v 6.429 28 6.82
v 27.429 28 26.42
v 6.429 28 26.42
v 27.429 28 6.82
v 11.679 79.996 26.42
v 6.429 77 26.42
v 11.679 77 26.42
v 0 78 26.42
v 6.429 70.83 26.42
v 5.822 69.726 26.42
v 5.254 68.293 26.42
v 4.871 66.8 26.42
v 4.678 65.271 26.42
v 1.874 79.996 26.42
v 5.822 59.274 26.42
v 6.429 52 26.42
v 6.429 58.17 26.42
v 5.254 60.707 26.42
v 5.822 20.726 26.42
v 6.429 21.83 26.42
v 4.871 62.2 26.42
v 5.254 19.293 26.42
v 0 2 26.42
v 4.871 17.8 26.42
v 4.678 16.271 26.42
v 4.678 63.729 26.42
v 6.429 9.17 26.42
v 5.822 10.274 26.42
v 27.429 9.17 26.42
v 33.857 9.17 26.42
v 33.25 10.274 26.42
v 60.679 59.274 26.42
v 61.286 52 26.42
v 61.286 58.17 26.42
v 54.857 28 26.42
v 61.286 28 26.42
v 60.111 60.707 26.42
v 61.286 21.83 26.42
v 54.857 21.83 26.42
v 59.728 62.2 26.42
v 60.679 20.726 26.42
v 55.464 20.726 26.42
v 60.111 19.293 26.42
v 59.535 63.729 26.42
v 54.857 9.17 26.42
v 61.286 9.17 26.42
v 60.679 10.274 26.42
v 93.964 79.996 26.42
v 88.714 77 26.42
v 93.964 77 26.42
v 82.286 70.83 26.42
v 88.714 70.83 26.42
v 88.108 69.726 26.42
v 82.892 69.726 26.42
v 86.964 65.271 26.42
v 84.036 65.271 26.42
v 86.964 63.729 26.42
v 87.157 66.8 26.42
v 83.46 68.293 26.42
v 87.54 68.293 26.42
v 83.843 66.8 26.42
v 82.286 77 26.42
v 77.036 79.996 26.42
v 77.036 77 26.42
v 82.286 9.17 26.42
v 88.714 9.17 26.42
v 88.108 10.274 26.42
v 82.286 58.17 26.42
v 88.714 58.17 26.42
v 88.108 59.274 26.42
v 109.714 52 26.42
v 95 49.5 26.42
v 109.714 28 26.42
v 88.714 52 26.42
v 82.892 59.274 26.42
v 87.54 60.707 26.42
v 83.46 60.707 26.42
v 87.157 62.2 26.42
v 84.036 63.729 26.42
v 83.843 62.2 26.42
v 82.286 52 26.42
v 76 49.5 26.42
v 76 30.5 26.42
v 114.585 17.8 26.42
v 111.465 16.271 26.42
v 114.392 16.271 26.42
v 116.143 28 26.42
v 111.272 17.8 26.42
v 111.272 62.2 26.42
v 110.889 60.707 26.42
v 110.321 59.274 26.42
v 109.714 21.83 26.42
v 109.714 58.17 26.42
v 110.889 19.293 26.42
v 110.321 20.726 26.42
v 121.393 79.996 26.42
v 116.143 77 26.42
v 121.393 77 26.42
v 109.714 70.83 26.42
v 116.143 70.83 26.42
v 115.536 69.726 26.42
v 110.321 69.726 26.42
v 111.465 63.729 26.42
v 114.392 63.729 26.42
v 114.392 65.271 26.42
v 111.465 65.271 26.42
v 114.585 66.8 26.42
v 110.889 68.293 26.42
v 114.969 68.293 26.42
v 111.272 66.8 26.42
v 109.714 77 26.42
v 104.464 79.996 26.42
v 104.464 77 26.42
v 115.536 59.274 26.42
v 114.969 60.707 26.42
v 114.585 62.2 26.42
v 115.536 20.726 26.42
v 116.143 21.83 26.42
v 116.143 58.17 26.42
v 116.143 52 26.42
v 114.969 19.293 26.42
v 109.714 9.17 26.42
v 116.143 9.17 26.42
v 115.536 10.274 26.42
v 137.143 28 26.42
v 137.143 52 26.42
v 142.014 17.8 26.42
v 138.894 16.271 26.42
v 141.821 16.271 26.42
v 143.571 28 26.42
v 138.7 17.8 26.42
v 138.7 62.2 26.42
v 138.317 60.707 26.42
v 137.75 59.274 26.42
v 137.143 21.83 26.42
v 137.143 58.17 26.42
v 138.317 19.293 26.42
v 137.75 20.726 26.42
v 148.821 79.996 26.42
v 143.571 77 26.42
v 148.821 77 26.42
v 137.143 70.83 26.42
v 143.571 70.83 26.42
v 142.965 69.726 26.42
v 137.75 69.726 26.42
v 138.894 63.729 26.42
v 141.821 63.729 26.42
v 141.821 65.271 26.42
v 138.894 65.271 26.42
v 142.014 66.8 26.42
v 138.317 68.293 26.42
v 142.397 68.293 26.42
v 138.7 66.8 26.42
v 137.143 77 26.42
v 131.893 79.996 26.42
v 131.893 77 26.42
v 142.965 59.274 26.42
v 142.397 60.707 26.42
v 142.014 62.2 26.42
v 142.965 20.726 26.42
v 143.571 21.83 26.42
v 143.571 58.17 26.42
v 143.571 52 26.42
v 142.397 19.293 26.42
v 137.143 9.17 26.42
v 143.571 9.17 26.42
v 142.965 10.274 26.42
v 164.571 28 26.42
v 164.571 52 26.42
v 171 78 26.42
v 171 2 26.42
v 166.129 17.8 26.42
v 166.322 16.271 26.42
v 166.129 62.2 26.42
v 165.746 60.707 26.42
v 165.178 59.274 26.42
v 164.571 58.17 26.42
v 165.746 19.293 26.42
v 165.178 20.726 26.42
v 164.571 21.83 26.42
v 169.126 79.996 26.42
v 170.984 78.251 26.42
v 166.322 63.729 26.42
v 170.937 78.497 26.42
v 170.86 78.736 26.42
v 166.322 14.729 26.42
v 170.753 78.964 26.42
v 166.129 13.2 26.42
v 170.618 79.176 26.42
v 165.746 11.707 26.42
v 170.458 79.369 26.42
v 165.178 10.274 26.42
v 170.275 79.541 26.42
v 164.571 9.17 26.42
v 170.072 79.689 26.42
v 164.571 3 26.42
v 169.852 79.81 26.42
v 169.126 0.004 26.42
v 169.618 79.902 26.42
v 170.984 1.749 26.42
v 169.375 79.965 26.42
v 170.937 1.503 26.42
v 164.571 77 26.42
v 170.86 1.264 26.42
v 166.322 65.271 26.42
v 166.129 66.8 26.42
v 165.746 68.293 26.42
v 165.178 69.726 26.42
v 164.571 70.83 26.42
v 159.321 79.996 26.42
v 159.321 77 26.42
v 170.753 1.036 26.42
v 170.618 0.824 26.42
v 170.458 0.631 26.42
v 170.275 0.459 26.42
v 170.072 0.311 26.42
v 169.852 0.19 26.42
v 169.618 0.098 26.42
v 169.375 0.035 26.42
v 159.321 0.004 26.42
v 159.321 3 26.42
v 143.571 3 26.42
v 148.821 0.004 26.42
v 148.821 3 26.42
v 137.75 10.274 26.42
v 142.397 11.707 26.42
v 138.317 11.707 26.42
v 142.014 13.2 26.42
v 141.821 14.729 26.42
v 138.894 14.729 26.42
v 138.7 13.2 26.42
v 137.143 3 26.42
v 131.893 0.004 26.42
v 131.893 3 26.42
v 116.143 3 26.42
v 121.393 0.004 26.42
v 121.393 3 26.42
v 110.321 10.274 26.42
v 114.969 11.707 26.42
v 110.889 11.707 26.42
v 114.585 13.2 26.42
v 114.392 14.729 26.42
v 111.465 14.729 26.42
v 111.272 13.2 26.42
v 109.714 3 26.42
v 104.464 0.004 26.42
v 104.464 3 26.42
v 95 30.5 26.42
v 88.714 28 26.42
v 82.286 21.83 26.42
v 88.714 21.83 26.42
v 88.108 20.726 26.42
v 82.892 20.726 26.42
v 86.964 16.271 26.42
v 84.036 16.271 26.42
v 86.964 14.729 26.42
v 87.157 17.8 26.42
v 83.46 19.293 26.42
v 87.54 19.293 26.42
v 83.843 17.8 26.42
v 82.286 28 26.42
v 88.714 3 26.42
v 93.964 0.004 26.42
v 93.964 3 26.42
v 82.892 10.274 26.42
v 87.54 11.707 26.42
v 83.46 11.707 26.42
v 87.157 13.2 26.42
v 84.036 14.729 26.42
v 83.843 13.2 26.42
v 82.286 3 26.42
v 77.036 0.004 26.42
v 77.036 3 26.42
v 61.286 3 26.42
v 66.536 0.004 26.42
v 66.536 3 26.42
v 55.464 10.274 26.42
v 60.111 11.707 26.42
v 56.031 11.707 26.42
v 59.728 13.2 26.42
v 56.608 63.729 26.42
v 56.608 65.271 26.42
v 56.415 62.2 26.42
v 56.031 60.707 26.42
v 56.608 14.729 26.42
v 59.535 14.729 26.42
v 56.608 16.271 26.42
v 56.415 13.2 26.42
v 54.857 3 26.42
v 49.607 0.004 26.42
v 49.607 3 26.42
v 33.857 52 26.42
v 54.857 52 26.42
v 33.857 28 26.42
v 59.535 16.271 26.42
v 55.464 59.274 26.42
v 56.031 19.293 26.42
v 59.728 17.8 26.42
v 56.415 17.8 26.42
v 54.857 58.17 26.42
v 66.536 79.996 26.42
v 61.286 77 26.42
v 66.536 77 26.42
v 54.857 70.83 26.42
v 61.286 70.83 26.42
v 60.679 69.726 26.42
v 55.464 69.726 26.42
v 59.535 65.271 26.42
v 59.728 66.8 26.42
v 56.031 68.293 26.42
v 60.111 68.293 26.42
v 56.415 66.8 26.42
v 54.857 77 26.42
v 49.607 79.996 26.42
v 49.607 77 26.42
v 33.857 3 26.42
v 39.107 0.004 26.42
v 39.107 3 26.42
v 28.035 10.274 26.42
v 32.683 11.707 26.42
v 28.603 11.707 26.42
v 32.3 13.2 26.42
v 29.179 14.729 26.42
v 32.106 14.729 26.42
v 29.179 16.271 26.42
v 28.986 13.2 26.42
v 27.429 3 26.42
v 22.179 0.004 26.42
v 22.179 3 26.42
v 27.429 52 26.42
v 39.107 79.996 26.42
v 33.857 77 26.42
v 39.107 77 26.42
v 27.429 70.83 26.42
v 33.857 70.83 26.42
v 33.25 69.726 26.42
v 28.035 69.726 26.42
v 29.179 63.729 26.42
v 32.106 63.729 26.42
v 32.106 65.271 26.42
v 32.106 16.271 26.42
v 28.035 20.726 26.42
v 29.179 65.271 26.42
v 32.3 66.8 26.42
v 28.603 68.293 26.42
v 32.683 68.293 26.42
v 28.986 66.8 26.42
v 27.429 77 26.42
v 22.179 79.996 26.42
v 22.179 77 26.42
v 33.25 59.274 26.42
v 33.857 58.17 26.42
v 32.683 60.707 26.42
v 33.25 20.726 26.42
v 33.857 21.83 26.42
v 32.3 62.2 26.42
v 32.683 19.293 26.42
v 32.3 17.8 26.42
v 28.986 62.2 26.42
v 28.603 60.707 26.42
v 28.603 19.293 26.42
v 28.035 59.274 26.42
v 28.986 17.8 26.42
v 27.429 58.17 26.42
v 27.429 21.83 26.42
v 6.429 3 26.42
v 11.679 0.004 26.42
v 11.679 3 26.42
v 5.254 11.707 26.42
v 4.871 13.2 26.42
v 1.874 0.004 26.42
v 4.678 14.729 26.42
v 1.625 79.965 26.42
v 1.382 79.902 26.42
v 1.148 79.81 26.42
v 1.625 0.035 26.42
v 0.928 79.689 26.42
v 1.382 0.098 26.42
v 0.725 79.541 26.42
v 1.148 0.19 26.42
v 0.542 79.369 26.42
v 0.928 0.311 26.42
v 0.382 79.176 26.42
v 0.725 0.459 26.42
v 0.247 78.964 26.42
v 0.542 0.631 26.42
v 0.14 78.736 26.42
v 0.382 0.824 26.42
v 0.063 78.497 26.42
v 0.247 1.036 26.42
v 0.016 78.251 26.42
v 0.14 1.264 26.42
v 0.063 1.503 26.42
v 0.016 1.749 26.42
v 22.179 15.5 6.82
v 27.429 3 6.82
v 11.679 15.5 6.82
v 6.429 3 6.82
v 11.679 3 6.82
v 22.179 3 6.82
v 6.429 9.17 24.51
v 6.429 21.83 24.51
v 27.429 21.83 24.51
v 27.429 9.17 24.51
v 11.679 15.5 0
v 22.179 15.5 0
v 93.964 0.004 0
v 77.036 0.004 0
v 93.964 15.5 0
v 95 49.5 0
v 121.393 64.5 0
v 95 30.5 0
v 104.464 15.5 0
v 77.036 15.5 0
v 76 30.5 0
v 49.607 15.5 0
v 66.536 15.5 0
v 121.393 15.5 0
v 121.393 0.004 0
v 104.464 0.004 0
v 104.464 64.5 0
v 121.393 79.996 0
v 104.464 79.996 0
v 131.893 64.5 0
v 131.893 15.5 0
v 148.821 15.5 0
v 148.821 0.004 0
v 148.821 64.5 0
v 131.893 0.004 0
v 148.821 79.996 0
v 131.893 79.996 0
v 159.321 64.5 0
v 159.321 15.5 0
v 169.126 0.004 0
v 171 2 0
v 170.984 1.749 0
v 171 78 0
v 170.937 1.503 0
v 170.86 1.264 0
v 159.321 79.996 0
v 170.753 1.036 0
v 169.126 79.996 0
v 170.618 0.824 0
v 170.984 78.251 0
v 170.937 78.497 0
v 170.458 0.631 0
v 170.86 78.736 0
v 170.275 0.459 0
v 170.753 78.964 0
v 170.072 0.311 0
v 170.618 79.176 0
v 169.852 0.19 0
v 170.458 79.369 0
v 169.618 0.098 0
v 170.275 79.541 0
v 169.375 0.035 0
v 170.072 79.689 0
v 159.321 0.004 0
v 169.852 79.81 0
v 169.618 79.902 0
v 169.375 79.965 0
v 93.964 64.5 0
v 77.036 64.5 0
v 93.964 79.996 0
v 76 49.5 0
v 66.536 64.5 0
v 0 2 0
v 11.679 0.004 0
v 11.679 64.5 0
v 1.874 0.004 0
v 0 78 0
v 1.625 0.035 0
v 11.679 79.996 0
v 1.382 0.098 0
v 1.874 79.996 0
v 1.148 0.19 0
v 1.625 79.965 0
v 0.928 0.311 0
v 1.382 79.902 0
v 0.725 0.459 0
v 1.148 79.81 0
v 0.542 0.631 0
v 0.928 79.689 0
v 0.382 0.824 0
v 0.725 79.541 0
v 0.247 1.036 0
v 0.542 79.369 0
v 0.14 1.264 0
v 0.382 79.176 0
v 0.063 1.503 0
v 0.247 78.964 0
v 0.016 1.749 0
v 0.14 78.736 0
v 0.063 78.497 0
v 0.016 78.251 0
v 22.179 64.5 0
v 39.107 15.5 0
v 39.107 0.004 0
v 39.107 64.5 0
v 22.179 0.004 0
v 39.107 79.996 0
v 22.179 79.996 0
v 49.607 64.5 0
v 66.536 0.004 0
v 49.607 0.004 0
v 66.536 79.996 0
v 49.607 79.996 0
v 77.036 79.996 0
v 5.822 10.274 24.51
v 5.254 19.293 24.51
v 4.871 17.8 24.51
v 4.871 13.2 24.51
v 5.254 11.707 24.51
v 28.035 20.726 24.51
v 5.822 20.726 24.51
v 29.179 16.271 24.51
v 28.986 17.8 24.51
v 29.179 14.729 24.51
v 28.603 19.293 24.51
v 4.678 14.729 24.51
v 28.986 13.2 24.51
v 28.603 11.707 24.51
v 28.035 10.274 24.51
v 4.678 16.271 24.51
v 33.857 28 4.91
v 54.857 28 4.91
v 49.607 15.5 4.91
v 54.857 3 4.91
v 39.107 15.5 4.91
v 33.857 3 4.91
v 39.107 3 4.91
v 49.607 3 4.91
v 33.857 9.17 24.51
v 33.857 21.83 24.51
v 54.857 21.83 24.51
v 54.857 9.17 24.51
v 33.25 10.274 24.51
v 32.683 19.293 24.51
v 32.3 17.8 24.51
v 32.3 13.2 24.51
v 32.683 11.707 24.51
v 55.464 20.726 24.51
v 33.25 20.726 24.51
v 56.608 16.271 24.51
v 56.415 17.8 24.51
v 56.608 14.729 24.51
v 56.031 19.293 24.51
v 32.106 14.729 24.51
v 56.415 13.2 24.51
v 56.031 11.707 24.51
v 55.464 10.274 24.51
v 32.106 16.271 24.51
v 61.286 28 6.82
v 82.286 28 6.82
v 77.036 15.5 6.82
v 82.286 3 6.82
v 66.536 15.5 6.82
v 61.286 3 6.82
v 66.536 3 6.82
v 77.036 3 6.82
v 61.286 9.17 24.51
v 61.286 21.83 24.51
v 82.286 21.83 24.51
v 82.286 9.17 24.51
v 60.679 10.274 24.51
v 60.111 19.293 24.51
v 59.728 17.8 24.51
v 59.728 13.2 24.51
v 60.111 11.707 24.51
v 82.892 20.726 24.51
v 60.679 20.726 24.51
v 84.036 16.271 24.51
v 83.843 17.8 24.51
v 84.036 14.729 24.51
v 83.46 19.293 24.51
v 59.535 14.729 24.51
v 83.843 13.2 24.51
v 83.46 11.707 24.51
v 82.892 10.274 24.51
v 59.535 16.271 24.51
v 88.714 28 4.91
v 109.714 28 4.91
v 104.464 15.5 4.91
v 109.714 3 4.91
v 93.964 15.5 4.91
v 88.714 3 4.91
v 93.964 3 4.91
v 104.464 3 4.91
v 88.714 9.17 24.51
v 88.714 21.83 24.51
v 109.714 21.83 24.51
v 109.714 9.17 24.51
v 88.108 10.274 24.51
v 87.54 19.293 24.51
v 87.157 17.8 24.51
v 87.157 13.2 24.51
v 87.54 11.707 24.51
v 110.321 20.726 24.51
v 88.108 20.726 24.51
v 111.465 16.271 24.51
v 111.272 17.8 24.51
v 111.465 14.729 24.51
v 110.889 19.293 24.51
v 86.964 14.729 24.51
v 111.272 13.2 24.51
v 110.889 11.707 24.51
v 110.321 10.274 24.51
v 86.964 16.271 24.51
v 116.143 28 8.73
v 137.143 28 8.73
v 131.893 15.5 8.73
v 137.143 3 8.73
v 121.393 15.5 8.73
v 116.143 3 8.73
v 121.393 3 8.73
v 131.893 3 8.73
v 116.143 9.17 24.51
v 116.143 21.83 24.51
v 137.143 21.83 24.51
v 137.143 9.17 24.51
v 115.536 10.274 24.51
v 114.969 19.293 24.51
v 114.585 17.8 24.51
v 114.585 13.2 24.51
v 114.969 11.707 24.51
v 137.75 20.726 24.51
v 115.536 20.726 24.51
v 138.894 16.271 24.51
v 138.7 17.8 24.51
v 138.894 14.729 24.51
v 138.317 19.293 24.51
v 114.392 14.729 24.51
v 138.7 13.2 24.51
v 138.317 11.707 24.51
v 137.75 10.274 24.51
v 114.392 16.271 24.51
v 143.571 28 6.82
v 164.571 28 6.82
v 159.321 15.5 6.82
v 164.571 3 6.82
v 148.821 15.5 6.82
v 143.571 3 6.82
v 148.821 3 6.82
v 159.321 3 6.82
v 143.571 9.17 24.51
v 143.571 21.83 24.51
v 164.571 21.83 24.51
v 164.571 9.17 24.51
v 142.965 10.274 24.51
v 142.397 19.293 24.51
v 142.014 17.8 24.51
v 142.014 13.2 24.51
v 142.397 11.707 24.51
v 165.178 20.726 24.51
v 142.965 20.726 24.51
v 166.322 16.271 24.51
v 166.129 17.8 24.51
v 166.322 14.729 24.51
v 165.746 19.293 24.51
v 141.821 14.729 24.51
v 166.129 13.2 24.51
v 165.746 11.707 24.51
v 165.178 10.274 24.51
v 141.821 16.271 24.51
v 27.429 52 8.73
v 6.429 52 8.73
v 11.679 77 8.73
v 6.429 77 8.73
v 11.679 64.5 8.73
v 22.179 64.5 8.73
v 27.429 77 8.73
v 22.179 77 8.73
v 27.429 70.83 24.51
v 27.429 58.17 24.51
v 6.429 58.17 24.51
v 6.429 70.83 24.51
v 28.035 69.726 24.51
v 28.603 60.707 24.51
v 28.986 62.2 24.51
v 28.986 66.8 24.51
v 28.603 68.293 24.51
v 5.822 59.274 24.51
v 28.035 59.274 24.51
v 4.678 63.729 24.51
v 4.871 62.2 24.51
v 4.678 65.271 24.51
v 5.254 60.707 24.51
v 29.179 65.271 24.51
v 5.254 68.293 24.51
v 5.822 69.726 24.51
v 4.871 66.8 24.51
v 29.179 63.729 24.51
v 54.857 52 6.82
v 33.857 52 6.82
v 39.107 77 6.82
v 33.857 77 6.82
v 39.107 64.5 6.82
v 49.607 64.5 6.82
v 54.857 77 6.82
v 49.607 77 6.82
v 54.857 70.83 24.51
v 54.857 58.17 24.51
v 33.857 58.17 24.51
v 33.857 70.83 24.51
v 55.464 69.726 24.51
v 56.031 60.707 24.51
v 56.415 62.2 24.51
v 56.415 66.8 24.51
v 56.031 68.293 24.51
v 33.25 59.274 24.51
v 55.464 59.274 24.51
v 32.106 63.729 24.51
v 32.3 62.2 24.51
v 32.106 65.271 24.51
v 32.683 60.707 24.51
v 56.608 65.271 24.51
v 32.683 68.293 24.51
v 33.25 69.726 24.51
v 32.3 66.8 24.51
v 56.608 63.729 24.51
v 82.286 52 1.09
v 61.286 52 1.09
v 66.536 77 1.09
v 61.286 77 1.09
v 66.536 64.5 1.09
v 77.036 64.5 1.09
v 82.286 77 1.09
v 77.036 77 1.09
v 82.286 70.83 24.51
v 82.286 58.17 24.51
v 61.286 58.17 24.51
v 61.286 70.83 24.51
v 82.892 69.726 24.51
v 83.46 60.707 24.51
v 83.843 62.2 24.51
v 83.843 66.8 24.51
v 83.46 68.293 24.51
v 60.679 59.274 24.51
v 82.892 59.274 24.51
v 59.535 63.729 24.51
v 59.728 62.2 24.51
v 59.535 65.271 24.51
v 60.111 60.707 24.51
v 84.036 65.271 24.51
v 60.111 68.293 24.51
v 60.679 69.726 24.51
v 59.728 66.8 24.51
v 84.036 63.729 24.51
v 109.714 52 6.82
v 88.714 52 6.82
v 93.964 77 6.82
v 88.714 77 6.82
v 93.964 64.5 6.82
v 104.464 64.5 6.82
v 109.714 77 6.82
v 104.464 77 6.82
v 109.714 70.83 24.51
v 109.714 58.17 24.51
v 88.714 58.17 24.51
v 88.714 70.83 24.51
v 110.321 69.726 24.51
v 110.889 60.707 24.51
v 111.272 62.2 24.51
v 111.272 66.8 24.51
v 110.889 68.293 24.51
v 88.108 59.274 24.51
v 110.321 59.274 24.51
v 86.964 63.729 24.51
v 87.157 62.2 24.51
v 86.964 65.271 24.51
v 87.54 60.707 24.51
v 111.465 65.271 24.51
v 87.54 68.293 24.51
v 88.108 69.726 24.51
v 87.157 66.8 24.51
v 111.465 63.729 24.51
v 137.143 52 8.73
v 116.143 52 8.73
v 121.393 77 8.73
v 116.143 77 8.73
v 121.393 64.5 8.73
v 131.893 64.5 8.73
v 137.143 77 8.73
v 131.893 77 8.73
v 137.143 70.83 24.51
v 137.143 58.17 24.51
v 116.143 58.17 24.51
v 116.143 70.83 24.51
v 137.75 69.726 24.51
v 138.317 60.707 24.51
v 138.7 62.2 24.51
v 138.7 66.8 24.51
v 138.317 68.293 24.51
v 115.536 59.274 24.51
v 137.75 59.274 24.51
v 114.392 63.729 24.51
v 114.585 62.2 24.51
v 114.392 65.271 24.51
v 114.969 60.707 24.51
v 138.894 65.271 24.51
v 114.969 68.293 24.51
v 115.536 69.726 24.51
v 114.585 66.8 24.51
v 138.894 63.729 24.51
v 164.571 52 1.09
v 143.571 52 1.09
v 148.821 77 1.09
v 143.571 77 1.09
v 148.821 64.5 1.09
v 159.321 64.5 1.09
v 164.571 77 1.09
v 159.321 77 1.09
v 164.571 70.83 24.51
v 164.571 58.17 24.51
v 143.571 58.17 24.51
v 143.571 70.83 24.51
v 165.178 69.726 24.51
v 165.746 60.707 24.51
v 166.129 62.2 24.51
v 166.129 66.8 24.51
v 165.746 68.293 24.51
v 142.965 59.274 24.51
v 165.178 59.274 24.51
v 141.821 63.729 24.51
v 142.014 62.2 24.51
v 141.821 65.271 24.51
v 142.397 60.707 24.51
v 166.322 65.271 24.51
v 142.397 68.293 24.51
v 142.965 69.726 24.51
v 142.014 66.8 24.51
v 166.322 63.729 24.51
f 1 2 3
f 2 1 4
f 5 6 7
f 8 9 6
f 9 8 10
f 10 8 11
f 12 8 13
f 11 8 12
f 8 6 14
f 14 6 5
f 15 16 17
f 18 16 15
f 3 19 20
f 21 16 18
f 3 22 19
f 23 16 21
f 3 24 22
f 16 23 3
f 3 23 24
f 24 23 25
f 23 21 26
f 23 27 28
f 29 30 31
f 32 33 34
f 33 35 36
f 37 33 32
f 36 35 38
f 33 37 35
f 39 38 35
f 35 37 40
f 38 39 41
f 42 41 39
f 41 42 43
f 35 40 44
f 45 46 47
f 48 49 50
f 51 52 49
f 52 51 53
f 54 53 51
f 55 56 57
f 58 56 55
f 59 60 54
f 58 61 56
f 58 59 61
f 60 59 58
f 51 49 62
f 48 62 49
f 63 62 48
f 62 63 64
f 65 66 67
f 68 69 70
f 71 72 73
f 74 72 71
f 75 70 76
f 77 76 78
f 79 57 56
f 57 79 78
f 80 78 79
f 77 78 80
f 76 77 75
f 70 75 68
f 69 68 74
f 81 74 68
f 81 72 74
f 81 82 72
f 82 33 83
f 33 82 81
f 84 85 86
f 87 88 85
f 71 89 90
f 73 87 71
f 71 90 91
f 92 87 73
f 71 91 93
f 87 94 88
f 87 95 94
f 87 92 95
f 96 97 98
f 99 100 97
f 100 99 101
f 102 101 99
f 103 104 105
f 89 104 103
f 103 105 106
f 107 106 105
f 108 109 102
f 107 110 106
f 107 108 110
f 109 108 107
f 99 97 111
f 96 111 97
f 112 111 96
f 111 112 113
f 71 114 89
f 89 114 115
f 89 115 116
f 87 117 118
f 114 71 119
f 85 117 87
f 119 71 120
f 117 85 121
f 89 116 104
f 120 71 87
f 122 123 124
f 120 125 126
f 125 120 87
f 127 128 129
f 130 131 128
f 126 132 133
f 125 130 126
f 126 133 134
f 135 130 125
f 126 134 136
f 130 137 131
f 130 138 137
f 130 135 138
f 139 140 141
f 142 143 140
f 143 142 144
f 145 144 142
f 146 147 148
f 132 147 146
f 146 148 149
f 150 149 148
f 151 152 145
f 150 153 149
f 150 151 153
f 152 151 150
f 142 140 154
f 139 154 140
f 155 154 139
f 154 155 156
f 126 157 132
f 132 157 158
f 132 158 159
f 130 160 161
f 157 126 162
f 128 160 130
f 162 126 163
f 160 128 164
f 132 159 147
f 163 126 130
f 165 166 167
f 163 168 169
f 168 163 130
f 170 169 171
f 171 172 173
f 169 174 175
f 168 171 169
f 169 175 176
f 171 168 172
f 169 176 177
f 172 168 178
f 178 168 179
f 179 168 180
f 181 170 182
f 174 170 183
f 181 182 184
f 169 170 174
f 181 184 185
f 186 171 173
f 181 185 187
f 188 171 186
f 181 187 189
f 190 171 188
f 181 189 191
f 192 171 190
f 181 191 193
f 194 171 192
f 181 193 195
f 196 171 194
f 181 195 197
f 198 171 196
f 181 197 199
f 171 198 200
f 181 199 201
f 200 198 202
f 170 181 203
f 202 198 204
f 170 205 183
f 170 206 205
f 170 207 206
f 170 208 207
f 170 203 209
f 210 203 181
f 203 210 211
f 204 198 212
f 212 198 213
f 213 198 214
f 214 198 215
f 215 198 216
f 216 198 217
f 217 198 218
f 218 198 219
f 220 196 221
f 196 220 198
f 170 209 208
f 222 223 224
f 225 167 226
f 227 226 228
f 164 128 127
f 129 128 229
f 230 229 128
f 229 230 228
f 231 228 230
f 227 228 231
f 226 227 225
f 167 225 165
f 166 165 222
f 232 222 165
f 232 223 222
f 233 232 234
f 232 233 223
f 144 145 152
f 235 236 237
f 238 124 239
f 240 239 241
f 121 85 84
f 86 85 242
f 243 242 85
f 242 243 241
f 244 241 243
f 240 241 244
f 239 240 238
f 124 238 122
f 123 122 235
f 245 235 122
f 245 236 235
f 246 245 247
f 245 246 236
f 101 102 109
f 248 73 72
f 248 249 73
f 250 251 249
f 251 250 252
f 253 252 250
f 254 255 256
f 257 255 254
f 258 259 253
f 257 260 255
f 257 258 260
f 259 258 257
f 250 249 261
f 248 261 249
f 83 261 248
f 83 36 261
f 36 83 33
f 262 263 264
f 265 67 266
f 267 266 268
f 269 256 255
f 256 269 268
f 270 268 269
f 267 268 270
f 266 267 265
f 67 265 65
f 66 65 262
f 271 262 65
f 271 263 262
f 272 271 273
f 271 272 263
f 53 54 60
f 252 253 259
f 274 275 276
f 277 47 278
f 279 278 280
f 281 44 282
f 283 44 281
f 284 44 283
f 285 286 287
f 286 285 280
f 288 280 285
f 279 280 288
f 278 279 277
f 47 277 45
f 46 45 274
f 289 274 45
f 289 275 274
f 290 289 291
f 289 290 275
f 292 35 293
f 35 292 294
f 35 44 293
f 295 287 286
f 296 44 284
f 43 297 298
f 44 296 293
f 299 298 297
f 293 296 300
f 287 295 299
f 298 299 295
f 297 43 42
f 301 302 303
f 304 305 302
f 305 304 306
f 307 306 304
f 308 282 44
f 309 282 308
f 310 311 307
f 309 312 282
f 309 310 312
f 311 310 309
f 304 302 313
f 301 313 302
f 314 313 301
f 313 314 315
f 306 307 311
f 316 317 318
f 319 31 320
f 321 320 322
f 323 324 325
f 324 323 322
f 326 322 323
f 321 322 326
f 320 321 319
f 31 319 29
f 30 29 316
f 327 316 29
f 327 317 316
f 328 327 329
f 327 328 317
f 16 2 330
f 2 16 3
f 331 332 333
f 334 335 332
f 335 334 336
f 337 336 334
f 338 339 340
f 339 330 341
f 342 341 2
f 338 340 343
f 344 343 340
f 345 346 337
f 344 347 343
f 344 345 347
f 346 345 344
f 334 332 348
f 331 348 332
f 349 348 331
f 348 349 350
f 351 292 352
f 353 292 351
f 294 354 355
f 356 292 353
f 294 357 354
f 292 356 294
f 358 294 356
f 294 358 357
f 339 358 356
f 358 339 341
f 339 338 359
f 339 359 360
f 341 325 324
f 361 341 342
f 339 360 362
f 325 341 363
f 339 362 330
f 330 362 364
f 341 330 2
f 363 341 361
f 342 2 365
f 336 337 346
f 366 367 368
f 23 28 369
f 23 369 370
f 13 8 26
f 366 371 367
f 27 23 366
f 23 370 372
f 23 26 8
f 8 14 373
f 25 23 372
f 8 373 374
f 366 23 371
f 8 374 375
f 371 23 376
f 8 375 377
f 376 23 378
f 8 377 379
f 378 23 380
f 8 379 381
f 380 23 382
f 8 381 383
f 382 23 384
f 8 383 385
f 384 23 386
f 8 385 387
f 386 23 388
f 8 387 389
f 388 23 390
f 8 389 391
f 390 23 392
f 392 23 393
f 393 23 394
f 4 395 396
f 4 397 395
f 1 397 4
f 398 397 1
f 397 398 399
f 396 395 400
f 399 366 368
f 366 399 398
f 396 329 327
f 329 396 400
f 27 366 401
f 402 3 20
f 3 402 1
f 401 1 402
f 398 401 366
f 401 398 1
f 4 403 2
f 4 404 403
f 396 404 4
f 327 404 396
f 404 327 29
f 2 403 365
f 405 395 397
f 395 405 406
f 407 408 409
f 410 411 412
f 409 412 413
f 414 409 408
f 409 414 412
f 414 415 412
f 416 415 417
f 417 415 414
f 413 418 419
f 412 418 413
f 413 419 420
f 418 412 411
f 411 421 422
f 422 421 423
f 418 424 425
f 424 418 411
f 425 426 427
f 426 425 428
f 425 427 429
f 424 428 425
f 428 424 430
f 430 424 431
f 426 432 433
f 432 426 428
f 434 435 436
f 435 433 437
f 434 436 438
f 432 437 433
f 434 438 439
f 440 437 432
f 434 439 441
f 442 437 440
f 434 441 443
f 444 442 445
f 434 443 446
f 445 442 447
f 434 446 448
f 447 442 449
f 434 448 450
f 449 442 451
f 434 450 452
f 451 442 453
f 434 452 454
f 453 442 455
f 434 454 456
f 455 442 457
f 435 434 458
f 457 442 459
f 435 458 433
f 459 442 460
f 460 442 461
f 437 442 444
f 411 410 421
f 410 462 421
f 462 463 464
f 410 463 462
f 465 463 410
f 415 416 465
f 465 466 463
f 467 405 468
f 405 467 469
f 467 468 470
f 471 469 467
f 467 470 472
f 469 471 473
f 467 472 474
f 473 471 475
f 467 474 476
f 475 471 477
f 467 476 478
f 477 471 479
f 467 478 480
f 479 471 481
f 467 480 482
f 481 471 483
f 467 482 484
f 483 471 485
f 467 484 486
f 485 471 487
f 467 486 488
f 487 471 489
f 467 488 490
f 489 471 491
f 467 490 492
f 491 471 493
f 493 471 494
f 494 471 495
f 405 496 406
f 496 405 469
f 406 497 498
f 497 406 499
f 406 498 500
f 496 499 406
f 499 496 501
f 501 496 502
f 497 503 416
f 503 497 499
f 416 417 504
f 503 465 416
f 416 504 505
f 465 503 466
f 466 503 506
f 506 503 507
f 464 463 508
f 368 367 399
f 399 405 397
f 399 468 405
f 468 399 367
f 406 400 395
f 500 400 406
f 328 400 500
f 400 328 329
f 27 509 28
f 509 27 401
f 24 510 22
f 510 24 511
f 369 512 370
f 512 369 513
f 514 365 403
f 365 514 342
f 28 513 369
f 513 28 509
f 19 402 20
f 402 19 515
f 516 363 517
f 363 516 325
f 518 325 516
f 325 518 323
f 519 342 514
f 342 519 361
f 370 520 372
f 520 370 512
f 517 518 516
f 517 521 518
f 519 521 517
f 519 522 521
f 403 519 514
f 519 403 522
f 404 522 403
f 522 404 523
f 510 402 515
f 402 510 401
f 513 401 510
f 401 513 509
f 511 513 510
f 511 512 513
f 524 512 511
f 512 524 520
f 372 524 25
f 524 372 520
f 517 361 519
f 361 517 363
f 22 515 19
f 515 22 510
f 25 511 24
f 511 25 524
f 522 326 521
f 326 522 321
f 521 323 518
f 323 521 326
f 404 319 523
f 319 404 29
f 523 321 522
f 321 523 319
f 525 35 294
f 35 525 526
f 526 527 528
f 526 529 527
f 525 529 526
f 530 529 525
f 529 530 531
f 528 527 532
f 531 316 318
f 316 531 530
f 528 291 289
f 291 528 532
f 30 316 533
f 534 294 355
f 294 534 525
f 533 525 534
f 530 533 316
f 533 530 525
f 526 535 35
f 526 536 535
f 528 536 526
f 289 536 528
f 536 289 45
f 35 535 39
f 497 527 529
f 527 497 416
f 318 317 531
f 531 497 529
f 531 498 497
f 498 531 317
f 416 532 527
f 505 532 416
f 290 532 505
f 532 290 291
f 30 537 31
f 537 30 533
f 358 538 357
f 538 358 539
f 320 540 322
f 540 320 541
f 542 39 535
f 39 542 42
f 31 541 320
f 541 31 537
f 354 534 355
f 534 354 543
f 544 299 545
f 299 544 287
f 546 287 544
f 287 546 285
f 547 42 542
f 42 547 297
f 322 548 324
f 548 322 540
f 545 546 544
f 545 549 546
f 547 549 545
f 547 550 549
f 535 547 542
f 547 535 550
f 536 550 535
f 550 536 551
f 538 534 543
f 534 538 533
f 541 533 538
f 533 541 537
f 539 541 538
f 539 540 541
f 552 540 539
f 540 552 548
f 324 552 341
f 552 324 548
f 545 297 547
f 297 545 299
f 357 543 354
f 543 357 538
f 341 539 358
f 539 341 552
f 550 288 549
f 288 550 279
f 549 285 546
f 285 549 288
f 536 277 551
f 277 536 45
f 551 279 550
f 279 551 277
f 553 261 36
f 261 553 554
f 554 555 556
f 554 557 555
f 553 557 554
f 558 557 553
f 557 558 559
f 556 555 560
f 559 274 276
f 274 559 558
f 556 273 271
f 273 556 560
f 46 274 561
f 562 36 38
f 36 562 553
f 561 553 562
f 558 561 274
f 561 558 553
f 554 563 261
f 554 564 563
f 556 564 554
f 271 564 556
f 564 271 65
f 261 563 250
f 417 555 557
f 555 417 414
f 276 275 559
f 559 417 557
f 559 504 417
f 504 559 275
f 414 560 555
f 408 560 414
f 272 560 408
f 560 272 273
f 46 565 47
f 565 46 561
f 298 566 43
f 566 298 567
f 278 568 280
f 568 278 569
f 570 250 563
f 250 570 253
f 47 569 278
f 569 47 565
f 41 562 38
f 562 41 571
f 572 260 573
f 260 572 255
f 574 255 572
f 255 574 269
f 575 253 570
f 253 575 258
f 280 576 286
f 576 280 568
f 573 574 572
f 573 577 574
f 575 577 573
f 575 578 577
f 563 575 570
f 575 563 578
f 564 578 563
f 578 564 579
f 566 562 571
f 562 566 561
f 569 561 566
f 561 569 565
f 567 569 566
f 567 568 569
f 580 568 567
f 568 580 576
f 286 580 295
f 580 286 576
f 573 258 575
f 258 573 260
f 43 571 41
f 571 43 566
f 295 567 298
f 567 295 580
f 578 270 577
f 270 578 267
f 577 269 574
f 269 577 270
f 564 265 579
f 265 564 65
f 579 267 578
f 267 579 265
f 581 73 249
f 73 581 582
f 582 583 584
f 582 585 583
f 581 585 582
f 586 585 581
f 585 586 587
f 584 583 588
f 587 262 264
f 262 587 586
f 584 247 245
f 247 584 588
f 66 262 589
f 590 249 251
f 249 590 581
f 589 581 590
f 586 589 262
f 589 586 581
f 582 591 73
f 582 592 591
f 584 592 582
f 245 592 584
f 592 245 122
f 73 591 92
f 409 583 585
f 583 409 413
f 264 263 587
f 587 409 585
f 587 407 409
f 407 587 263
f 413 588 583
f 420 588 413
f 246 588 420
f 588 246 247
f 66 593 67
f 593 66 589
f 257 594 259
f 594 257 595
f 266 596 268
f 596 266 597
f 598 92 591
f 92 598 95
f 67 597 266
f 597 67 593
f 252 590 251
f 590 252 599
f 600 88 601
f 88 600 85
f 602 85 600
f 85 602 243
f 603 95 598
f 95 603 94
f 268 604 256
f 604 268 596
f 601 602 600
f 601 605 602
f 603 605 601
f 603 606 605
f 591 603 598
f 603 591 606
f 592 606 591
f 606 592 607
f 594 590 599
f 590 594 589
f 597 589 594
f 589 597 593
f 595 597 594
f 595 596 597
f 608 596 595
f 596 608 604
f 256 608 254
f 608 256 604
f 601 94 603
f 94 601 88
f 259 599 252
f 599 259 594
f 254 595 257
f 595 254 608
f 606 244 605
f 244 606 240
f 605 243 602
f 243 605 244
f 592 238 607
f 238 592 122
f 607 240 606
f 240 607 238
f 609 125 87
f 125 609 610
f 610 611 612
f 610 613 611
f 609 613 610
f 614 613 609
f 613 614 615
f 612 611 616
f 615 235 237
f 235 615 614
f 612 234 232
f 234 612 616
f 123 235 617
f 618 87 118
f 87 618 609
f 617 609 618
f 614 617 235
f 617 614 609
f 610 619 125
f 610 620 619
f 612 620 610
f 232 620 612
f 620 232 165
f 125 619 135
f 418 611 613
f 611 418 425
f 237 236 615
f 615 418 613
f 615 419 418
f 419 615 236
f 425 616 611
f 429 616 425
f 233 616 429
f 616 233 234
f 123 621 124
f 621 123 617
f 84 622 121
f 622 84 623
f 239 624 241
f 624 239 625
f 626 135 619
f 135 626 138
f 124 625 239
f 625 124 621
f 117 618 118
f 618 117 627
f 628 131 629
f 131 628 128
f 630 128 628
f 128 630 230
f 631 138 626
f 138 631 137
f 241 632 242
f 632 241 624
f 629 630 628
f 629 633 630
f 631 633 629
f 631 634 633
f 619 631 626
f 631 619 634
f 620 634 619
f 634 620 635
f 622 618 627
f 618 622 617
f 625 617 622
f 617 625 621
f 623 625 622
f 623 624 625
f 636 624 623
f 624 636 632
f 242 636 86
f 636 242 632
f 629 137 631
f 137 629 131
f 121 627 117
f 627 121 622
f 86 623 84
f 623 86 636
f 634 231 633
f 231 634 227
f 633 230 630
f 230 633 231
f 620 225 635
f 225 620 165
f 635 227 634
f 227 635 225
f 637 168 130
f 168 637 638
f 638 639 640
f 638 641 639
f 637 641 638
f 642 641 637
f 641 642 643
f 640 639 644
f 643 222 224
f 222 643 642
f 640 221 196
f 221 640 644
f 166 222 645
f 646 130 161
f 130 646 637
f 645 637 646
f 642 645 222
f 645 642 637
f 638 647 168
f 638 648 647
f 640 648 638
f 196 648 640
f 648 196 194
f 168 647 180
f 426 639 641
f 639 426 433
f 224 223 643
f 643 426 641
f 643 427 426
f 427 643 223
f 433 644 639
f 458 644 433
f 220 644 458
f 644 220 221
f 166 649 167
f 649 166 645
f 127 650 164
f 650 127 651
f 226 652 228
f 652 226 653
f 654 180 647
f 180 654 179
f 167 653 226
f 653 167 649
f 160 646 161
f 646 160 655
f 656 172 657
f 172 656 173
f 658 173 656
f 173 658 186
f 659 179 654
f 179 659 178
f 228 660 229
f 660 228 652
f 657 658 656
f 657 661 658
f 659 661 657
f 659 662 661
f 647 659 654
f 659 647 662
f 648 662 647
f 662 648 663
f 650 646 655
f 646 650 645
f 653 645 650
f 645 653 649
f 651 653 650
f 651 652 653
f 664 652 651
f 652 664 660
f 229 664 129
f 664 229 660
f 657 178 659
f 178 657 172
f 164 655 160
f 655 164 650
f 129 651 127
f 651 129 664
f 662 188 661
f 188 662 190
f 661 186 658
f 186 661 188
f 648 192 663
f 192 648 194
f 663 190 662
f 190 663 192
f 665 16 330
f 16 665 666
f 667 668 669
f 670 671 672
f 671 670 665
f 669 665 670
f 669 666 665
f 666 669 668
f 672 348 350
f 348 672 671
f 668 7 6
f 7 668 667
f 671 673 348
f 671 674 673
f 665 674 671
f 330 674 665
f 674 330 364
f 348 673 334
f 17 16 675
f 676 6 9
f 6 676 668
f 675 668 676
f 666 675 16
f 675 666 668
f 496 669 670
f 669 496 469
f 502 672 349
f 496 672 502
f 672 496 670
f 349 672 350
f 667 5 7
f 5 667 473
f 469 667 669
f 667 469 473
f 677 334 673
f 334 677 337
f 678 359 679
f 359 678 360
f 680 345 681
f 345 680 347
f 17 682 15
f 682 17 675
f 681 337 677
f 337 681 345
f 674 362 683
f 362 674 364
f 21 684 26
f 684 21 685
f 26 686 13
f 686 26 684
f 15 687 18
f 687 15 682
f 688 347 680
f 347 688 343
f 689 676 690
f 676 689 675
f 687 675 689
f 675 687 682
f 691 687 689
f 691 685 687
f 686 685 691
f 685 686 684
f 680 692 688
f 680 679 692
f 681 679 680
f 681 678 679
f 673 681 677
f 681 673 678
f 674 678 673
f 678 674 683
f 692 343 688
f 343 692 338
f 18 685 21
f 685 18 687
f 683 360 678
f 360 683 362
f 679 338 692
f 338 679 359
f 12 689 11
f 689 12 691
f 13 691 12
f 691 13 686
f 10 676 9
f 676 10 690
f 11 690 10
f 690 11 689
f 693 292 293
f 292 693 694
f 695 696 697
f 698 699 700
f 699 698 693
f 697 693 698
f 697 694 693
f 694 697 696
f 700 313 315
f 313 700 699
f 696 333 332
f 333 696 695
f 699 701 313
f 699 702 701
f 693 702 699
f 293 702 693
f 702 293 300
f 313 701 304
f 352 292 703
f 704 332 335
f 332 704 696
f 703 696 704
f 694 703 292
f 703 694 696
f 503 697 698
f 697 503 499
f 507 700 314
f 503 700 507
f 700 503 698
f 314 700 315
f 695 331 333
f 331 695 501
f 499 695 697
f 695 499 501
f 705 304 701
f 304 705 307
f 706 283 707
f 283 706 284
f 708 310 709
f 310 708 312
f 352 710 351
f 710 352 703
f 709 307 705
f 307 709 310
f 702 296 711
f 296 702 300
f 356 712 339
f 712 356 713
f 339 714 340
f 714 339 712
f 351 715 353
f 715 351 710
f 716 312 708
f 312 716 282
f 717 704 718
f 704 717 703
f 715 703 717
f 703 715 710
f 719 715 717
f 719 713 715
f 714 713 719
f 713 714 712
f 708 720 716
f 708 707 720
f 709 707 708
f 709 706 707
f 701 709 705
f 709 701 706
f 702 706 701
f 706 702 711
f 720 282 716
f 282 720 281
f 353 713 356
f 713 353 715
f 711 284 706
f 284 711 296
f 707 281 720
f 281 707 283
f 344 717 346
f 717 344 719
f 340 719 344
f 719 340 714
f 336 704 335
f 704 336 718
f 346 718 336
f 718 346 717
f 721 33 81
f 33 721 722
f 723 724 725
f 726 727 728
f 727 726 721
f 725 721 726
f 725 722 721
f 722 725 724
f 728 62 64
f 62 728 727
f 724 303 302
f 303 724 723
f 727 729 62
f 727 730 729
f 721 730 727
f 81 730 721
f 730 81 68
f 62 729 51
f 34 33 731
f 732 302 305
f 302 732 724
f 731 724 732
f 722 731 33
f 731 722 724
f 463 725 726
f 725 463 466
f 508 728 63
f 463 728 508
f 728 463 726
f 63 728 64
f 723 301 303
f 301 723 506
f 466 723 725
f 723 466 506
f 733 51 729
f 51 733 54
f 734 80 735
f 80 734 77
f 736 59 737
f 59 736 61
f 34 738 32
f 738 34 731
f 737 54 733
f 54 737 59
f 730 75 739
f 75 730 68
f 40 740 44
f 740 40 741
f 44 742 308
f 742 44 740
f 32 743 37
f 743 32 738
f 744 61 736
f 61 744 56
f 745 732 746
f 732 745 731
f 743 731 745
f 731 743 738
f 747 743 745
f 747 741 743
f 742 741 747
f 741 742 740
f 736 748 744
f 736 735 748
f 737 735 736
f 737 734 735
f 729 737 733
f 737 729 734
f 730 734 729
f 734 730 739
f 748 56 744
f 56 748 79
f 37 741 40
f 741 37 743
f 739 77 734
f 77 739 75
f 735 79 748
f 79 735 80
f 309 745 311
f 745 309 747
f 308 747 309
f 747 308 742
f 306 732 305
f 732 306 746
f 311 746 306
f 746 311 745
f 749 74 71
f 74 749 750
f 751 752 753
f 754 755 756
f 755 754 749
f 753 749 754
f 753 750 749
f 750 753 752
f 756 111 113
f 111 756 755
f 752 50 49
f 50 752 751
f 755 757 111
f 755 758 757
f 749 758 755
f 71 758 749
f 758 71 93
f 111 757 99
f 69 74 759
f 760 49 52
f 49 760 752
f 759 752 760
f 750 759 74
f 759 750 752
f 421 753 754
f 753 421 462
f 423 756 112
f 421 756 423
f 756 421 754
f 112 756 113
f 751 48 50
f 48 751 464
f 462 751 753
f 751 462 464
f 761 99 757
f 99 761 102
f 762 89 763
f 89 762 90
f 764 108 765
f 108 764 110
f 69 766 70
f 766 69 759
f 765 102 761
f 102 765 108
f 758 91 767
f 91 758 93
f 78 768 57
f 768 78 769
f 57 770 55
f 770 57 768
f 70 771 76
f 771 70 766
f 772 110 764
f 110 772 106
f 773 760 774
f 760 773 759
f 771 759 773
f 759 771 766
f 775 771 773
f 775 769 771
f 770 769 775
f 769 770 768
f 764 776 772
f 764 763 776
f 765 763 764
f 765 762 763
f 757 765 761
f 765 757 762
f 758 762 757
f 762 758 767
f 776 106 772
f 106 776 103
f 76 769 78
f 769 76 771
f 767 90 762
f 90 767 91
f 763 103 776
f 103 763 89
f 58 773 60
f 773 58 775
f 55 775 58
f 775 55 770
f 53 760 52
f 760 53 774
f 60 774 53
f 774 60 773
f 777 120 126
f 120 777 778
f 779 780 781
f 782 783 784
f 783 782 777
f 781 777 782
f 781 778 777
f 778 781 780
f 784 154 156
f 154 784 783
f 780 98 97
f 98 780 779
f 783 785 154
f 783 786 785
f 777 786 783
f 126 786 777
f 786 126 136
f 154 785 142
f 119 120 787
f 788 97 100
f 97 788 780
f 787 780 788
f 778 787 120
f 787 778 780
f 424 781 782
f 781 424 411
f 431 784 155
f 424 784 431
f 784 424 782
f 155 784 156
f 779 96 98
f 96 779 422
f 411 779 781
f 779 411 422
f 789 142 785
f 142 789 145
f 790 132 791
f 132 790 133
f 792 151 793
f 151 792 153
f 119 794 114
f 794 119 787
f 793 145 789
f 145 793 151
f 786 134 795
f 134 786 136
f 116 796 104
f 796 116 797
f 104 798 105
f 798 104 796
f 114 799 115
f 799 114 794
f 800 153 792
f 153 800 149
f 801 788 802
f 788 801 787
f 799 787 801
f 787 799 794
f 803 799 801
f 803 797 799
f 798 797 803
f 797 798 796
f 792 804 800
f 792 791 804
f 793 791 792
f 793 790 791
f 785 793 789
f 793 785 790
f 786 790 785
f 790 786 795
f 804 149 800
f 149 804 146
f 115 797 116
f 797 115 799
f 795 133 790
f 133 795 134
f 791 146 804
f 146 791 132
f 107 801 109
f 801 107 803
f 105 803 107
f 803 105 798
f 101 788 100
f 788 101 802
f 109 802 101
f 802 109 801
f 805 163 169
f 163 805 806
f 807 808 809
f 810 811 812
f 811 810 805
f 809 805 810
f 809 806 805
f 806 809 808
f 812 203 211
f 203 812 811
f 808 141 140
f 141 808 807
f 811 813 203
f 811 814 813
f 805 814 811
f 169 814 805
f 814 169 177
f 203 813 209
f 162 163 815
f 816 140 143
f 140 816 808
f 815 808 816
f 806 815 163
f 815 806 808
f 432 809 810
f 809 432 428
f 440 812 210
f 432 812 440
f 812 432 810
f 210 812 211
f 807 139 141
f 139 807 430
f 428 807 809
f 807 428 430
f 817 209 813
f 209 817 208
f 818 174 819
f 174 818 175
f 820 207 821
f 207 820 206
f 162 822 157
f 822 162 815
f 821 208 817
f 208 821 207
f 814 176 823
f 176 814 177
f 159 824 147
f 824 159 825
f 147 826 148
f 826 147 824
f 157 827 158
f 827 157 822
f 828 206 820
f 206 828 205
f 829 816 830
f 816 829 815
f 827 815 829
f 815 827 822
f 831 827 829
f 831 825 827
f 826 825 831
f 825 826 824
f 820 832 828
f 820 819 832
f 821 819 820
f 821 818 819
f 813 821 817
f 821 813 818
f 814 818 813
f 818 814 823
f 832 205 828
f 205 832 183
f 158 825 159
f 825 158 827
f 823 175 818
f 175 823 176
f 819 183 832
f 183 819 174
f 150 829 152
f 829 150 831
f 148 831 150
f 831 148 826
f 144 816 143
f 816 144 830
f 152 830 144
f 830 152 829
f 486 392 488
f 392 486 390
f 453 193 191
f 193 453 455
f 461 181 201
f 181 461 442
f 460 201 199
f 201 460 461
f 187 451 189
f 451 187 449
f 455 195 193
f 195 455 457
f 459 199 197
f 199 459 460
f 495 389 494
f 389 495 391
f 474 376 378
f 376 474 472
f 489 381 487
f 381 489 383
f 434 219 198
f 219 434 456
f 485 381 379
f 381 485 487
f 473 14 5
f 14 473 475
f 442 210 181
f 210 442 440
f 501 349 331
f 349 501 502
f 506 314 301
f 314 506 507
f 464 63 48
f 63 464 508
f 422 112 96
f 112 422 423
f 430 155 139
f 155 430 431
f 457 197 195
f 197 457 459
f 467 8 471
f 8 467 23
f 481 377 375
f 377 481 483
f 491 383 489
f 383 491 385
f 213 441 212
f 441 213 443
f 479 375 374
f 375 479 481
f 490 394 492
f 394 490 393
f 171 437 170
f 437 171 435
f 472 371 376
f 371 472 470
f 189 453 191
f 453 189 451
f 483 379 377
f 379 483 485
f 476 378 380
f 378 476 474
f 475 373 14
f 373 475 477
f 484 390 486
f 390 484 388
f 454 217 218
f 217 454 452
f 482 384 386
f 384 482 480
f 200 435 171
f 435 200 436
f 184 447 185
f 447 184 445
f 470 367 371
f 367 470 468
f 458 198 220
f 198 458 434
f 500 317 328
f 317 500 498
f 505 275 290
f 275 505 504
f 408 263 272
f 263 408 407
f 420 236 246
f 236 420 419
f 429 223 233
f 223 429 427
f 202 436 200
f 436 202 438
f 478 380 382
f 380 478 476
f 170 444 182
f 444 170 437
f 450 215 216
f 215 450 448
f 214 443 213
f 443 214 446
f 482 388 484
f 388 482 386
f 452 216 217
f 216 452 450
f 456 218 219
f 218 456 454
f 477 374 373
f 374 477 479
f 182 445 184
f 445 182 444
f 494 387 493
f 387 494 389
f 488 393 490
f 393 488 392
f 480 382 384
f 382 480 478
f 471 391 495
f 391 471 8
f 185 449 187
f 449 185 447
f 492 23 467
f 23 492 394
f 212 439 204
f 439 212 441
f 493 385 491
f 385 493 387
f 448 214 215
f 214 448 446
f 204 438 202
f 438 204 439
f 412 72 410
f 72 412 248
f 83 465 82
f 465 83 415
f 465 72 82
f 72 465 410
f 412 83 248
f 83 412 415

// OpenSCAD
// file: SquareWithCircleTokenPileLib.scad
module LeftPile(
    wallThickness,
    totalHeight,
    singlePileHeight,
    singlePileWidth,
    singlePileLength,
    pileCount,
    circleTokenDiameter,
    circleTokenHeight,
    openingSizePercent = .75
) {
    pileHeight = (pileCount * singlePileHeight) + .5 + circleTokenHeight;
    lengthOpeningSize = singlePileLength * openingSizePercent;
    widthOpeningSize = singlePileWidth * openingSizePercent;
    blockerSize = (singlePileWidth - widthOpeningSize) / 2;
    
    translate([wallThickness, wallThickness, totalHeight - pileHeight])
        cube([singlePileLength, singlePileWidth, pileHeight]);
    translate([-.00001, wallThickness + (blockerSize), 0])
        cube([wallThickness + lengthOpeningSize, widthOpeningSize, totalHeight]);
    translate([wallThickness + singlePileLength/2, wallThickness + singlePileWidth/2, totalHeight - circleTokenHeight])
        cylinder(d=circleTokenDiameter, h=circleTokenHeight);
}

module RightPile(
    wallThickness,
    totalHeight,
    singlePileHeight,
    singlePileWidth,
    singlePileLength,
    pileCount,
    circleTokenDiameter,
    circleTokenHeight,
    openingSizePercent = .75
){
    translate([0, wallThickness + wallThickness + singlePileWidth, 0])
        rotate([0, 0, 180])
            LeftPile(
                wallThickness,
                totalHeight,
                singlePileHeight,
                singlePileWidth,
                singlePileLength,
                pileCount,
                circleTokenDiameter,
                circleTokenHeight,
                openingSizePercent);
}

module BottomPile(
  wallThickness,
    totalHeight,
    singlePileHeight,
    singlePileWidth,
    singlePileLength,
    pileCount,
    circleTokenDiameter,
    circleTokenHeight,
    openingSizePercent = .75
){
    translate([wallThickness + wallThickness + singlePileWidth, 0, 0])
        rotate([0, 0, 90])
            LeftPile(
                wallThickness,
                totalHeight,
                singlePileHeight,
                singlePileWidth,
                singlePileLength,
                pileCount,
                circleTokenDiameter,
                circleTokenHeight,
                openingSizePercent);
}

module TopPile(
  wallThickness,
    totalHeight,
    singlePileHeight,
    singlePileWidth,
    singlePileLength,
    pileCount,
    circleTokenDiameter,
    circleTokenHeight,
    openingSizePercent = .75
){
        rotate([0, 0, 270])
            LeftPile(
                wallThickness,
                totalHeight,
                singlePileHeight,
                singlePileWidth,
                singlePileLength,
                pileCount,
                circleTokenDiameter,
                circleTokenHeight,
                openingSizePercent);
}
// file: CoreLib.scad
function whiteSpaceBetweenBoxes(side, numberOfBoxes, boxLength) =
    (side - (numberOfBoxes * boxLength)) / (numberOfBoxes + 1);
    
function getOffsetForWhiteSpace(whiteSpaceBetweenBoxes, index, boxLength, singleBoxOffset) =
    ((index + 1) * whiteSpaceBetweenBoxes + boxLength * (index)) + singleBoxOffset;
// file: BrewcraftersBeerTokensLib.scad
include<SquareWithCircleTokenPileLib.scad>
singleBeerTokenPileHeight = 1.91;
singleBeerTokenPileWidth = 19.5 + 1.5;
singleBeerTokenPileLength = 23.5 + 1.5;
goldLabelDiameter = 24.05 + .5;
goldLabelHeight = 1.91;
openingSizePercent = .5;
boxWidth = goldLabelDiameter;

module LeftBeerTokenPile(wallThickness, totalHeight, beerTokenPileCount){
    LeftPile(
        wallThickness,
        totalHeight,
        singleBeerTokenPileHeight,
        singleBeerTokenPileWidth,
        singleBeerTokenPileLength,
        beerTokenPileCount,
        goldLabelDiameter,
        goldLabelHeight,
        openingSizePercent);
}

module RightBeerTokenPile(wallThickness, totalHeight, beerTokenPileCount){
    RightPile(
        wallThickness,
        totalHeight,
        singleBeerTokenPileHeight,
        singleBeerTokenPileWidth,
        singleBeerTokenPileLength,
        beerTokenPileCount,
        goldLabelDiameter,
        goldLabelHeight,
        openingSizePercent);
}

module BottomBeerTokenPile(wallThickness, totalHeight, beerTokenPileCount){
    BottomPile(
        wallThickness,
        totalHeight,
        singleBeerTokenPileHeight,
        singleBeerTokenPileWidth,
        singleBeerTokenPileLength,
        beerTokenPileCount,
        goldLabelDiameter,
        goldLabelHeight,
        openingSizePercent);
}

module TopBeerTokenPile(wallThickness, totalHeight, beerTokenPileCount){
    TopPile(
        wallThickness,
        totalHeight,
        singleBeerTokenPileHeight,
        singleBeerTokenPileWidth,
        singleBeerTokenPileLength,
        beerTokenPileCount,
        goldLabelDiameter,
        goldLabelHeight,
        openingSizePercent);
}

function beerTokenPileHeight(beerTokenPileCount) =
    (beerTokenPileCount * singleBeerTokenPileHeight) + .5;
// main file
include<BrewcraftersBeerTokensLib.scad>
include<CoreLib.scad>
topBoxBeerTokensPerStack = [8,9,12,9,8,12];
numberOfTopBoxes = len(topBoxBeerTokensPerStack);

bottomBoxBeerTokensPerStack = [9,10,9,10,8,9];
numberOfBottomBoxes = len(bottomBoxBeerTokensPerStack);

leftBoxBeerTokensPerStack = [];
numberOfLeftBoxes = len(leftBoxBeerTokensPerStack);

rightBoxBeerTokensPerStack = [];
numberOfRightBoxes = len(rightBoxBeerTokensPerStack);


magnetHoleWidth = 19;
floorThickness = 3;
wallThickness = 3;
maxBeerTokensPerStack = max(
    (numberOfTopBoxes > 0) ? max(topBoxBeerTokensPerStack) : 0,
    (numberOfBottomBoxes > 0) ? max(bottomBoxBeerTokensPerStack) : 0,
    (numberOfLeftBoxes > 0) ? max(leftBoxBeerTokensPerStack) : 0,
    (numberOfRightBoxes > 0) ? max(rightBoxBeerTokensPerStack) : 0
);
height = beerTokenPileHeight(maxBeerTokensPerStack) + floorThickness;
length = (singleBeerTokenPileLength * max(numberOfTopBoxes, numberOfBottomBoxes)) + (wallThickness * (max(numberOfTopBoxes, numberOfBottomBoxes) + 1));
width = 80;
echo ("height = ", height);
echo ("length = ", length);

difference() {

//    whitespace between boxes = (total length - (# of boxes * width of boxes)) / (# of boxes + 1)
//    position of box n = whitespace * n + 1 + width of box * (n)
    
    $fn=50;
    minkowski()
    {
      translate([2,2,0])
        cube([length-4, width-4, height - 1]);
      cylinder(r=2,h=1);
    }
    
//    cube([length, width, height]);

    whiteSpaceBetweenTopBoxes = whiteSpaceBetweenBoxes(length, numberOfTopBoxes, singleBeerTokenPileWidth);
    whiteSpaceBetweenBottomBoxes = whiteSpaceBetweenBoxes(length, numberOfBottomBoxes, singleBeerTokenPileWidth);
    remainingWidth = width - (2 * singleBeerTokenPileWidth);
    whiteSpaceBetweenLeftBoxes = whiteSpaceBetweenBoxes(remainingWidth, numberOfLeftBoxes, singleBeerTokenPileWidth);
    whiteSpaceBetweenRightBoxes = whiteSpaceBetweenBoxes(remainingWidth, numberOfRightBoxes, singleBeerTokenPileWidth);

    if (numberOfBottomBoxes != 0)
    {
        for(i=[0:numberOfBottomBoxes - 1]){
            translate([
                getOffsetForWhiteSpace(whiteSpaceBetweenBottomBoxes, i, singleBeerTokenPileWidth, -wallThickness),
                0,
                0])
                BottomBeerTokenPile(wallThickness, height, bottomBoxBeerTokensPerStack[i]);
        }
    }
    
    
    if (numberOfTopBoxes != 0)
    {
        for(i=[0:numberOfTopBoxes - 1]){
            translate([
                getOffsetForWhiteSpace(whiteSpaceBetweenTopBoxes, i, singleBeerTokenPileWidth, -wallThickness),
                width,
                0])
                TopBeerTokenPile(wallThickness, height, topBoxBeerTokensPerStack[i]);
        }
    }
    
    if (numberOfLeftBoxes != 0)
    {
        for(i=[0:numberOfLeftBoxes - 1]){
            translate([
                0,
                getOffsetForWhiteSpace(whiteSpaceBetweenLeftBoxes, i, singleBeerTokenPileWidth, singleBeerTokenPileWidth - wallThickness),
                0])
                LeftBeerTokenPile(wallThickness, height, leftBoxBeerTokensPerStack[i]);
        }
    }
    
    if (numberOfRightBoxes != 0)
    {
        for(i=[0:numberOfRightBoxes - 1]){
            translate([
                length,
                getOffsetForWhiteSpace(whiteSpaceBetweenRightBoxes, i, singleBeerTokenPileWidth, singleBeerTokenPileWidth - wallThickness),
                0])
                RightBeerTokenPile(wallThickness, height, rightBoxBeerTokensPerStack[i]);
        }
    }
    
    translate([length/2 - magnetHoleWidth/2, width/2 - magnetHoleWidth/2, 0])
        cube([magnetHoleWidth, magnetHoleWidth, height]);
}
